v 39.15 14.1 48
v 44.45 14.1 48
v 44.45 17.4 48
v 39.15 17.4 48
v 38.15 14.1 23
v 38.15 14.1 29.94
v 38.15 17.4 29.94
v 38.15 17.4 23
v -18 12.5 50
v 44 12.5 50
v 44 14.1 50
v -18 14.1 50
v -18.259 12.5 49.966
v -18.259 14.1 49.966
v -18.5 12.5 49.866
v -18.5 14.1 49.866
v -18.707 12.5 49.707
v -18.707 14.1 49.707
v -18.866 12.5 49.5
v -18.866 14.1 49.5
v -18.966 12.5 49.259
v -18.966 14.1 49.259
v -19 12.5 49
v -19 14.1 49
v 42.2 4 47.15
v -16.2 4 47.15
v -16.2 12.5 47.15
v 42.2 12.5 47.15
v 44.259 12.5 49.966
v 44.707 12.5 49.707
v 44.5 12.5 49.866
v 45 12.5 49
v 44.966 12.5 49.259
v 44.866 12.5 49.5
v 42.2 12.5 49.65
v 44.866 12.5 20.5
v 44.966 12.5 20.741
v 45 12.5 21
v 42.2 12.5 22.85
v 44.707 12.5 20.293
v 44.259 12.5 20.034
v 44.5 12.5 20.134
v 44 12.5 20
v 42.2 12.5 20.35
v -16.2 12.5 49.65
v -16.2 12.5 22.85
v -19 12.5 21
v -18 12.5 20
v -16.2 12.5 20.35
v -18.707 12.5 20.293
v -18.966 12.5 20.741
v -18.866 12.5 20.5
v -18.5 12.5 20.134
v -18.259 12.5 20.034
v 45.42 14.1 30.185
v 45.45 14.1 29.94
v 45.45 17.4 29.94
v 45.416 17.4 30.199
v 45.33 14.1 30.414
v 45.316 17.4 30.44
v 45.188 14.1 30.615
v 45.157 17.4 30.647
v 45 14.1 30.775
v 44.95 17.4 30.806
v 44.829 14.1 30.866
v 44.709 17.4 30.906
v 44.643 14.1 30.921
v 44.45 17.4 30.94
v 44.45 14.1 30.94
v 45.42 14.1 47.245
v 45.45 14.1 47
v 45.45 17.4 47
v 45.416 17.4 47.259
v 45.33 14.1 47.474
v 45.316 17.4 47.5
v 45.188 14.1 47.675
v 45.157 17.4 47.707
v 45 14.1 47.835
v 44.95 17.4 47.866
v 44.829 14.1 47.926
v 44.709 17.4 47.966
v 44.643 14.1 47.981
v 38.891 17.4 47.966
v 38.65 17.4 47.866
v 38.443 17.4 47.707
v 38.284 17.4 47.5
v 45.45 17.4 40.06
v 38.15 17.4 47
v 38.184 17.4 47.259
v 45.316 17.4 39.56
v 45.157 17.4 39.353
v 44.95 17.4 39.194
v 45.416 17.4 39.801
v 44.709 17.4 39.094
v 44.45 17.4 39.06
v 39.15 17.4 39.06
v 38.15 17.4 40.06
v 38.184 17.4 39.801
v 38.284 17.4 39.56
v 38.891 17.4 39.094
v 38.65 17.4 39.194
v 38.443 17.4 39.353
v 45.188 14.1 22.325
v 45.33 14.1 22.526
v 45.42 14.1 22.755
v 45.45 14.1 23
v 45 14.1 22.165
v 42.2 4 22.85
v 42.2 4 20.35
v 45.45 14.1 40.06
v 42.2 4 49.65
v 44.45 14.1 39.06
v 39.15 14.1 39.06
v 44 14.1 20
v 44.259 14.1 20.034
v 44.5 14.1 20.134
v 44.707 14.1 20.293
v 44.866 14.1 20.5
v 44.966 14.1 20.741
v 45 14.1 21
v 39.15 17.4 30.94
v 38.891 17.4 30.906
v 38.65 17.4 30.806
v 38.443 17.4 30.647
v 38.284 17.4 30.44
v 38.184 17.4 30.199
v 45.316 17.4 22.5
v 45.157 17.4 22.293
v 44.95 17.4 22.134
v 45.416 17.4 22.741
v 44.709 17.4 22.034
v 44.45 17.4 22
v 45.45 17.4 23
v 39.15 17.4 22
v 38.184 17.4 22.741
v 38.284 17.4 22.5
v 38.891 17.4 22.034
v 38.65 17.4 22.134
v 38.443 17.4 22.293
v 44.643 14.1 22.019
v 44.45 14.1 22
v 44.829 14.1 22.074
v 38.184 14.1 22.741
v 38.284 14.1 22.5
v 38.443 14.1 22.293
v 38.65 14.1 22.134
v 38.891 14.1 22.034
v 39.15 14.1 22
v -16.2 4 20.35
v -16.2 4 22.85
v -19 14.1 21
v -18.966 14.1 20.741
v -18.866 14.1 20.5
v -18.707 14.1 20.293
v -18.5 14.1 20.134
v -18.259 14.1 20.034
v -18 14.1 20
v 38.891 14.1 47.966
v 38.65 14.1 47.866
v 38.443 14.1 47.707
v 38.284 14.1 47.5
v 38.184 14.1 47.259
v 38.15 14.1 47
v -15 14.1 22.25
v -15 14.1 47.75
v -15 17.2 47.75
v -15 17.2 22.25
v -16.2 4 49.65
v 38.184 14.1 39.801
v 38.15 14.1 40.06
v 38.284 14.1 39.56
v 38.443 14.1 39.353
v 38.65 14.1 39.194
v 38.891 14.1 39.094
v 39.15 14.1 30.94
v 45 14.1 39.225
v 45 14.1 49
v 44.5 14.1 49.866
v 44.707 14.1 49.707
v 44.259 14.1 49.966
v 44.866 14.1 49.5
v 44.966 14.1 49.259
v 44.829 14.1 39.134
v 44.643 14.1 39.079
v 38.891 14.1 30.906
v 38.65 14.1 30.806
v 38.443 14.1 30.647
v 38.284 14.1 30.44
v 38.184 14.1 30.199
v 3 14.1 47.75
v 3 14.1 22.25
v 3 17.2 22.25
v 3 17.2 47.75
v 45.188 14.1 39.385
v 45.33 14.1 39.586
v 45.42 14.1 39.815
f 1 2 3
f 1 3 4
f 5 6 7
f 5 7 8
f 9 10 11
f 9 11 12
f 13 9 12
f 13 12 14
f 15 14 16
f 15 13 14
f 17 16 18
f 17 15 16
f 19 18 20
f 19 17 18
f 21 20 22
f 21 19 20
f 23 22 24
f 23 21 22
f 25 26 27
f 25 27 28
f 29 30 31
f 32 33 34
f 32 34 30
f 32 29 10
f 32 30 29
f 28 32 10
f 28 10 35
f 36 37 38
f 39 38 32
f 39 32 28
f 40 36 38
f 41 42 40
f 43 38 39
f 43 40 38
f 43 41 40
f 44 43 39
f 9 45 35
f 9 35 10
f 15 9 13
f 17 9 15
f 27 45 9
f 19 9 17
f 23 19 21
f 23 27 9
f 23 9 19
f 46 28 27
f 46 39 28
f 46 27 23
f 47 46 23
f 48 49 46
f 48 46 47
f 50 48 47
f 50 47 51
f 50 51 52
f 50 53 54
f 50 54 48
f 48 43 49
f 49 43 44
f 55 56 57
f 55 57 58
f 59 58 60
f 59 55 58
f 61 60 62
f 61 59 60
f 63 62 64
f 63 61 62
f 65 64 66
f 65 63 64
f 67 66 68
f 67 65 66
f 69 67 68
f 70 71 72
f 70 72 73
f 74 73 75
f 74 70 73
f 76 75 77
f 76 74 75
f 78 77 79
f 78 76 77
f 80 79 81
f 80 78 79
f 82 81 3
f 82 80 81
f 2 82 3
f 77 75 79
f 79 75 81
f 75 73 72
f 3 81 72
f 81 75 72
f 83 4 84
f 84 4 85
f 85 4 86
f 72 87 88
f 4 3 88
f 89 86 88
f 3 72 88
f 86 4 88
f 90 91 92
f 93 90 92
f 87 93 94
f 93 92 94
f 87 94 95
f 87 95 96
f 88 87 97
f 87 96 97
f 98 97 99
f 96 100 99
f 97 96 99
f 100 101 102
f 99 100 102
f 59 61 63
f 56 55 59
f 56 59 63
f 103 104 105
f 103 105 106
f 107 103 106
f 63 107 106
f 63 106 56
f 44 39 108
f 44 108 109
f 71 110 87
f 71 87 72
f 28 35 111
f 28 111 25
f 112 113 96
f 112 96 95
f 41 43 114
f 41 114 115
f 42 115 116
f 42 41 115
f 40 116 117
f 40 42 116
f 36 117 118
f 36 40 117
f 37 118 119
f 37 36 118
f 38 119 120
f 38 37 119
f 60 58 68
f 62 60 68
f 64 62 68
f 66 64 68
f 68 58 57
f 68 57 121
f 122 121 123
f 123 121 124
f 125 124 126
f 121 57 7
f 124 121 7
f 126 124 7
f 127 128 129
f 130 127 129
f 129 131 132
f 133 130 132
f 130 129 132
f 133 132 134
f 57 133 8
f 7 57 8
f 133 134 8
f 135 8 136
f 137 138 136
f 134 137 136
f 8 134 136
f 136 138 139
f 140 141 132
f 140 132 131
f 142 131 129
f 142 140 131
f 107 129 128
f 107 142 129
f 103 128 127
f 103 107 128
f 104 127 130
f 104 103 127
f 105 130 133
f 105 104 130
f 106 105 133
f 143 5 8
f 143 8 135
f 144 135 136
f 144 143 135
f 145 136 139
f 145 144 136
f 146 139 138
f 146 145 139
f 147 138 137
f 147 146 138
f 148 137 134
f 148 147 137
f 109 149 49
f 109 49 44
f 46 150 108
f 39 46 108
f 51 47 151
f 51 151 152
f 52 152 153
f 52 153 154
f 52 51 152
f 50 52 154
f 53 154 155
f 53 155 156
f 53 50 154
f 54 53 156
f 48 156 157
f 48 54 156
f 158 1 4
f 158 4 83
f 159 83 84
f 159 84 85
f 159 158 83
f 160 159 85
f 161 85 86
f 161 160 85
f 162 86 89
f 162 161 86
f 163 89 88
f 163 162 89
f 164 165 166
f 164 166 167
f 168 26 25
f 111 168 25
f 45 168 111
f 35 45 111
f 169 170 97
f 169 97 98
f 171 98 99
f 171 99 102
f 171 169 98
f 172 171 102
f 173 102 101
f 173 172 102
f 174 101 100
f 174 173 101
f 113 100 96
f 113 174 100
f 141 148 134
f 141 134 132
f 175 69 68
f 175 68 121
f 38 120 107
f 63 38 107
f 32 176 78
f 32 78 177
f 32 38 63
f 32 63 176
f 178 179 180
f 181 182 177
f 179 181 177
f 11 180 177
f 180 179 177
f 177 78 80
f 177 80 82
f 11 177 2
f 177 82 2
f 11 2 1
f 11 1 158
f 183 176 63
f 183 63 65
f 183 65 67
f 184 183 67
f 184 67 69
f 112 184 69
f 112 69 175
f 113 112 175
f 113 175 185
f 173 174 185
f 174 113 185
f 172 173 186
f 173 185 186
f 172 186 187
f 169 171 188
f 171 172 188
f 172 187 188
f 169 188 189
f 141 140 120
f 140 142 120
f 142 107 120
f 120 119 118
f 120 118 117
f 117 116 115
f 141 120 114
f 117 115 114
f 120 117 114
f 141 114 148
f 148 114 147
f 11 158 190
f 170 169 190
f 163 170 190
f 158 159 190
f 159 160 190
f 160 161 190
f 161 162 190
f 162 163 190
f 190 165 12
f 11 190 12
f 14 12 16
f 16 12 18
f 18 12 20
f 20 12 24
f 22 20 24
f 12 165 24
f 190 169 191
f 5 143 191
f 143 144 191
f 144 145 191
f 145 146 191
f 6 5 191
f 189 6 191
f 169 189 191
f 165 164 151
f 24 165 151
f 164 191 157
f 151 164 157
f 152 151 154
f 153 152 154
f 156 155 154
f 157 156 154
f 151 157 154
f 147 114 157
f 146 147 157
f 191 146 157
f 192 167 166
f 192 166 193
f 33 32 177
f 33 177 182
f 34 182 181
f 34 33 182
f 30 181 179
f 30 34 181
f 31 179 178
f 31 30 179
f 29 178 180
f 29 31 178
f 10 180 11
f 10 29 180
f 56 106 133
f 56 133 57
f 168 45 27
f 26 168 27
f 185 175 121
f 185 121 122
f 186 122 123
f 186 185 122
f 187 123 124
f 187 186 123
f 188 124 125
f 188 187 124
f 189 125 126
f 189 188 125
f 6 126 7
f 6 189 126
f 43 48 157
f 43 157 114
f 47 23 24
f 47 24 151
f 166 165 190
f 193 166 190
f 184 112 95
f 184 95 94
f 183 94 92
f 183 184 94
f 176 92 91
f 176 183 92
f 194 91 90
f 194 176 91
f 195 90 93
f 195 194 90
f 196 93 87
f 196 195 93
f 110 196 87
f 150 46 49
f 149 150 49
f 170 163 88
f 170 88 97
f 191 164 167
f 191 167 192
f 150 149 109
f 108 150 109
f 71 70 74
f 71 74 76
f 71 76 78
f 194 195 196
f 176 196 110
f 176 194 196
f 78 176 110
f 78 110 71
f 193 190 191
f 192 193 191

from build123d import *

# Parameters (mm, degrees)
BOARD_START   = 12.5
BOARD_DEPTH   = 1.6
WROOM_START   = 14.1
SKETCH2_W     = 18
SKETCH2_H     = 25.5
WROOM_DEPTH   = 3.1
USB_C_START   = 14.1
USB_C_DEPTH   = 3.3
HEADERS_START = 4
SKETCH4_W     = 58.4
SKETCH4_H     = 2.5
HEADERS_DEPTH = 8.5


with BuildPart() as part:
    # Sketch1 → Board (new body)
    with BuildSketch(Plane(origin=(0, 0, 0), x_dir=(1, 0, 0), z_dir=(0, 1, 0)).offset(BOARD_START)):
        with BuildLine():
            Line((-18, -20), (44, -20))
            ThreePointArc((44, -20), (44.707106781, -20.292893219), (45, -21))
            Line((45, -21), (45, -49))
            ThreePointArc((45, -49), (44.707106781, -49.707106781), (44, -50))
            Line((44, -50), (-18, -50))
            ThreePointArc((-18, -50), (-18.707106781, -49.707106781), (-19, -49))
            Line((-19, -49), (-19, -21))
            ThreePointArc((-19, -21), (-18.707106781, -20.292893219), (-18, -20))
        make_face()
    extrude(amount=BOARD_DEPTH)

    # Sketch2 → WROOM (add)
    with BuildSketch(Plane(origin=(0, 0, 0), x_dir=(1, 0, 0), z_dir=(0, 1, 0)).offset(WROOM_START)):
        with Locations((-6, -35)):
            Rectangle(SKETCH2_W, SKETCH2_H)
    extrude(amount=WROOM_DEPTH)

    # Sketch3 → USB-C (add)
    with BuildSketch(Plane(origin=(0, 0, 0), x_dir=(1, 0, 0), z_dir=(0, 1, 0)).offset(USB_C_START)):
        with BuildLine():
            Line((39.15, -22), (44.45, -22))
            ThreePointArc((44.45, -22), (45.157106781, -22.292893219), (45.45, -23))
            Line((45.45, -23), (45.45, -29.94))
            ThreePointArc((45.45, -29.94), (45.157106781, -30.647106781), (44.45, -30.94))
            Line((44.45, -30.94), (39.15, -30.94))
            ThreePointArc((39.15, -30.94), (38.442893219, -30.647106781), (38.15, -29.94))
            Line((38.15, -29.94), (38.15, -23))
            ThreePointArc((38.15, -23), (38.442893219, -22.292893219), (39.15, -22))
        make_face()
        with BuildLine():
            Line((39.15, -39.06), (44.45, -39.06))
            ThreePointArc((44.45, -39.06), (45.157106781, -39.352893219), (45.45, -40.06))
            Line((45.45, -40.06), (45.45, -47))
            ThreePointArc((45.45, -47), (45.157106781, -47.707106781), (44.45, -48))
            Line((44.45, -48), (39.15, -48))
            ThreePointArc((39.15, -48), (38.442893219, -47.707106781), (38.15, -47))
            Line((38.15, -47), (38.15, -40.06))
            ThreePointArc((38.15, -40.06), (38.442893219, -39.352893219), (39.15, -39.06))
        make_face()
    extrude(amount=USB_C_DEPTH)

    # Sketch4 → Headers (add)
    with BuildSketch(Plane(origin=(0, 0, 0), x_dir=(1, 0, 0), z_dir=(0, 1, 0)).offset(HEADERS_START)):
        with Locations((13, -21.6)):
            Rectangle(SKETCH4_W, SKETCH4_H)
        with Locations((13, -48.4)):
            Rectangle(SKETCH4_W, SKETCH4_H)
    extrude(amount=HEADERS_DEPTH)


solid = part.part
